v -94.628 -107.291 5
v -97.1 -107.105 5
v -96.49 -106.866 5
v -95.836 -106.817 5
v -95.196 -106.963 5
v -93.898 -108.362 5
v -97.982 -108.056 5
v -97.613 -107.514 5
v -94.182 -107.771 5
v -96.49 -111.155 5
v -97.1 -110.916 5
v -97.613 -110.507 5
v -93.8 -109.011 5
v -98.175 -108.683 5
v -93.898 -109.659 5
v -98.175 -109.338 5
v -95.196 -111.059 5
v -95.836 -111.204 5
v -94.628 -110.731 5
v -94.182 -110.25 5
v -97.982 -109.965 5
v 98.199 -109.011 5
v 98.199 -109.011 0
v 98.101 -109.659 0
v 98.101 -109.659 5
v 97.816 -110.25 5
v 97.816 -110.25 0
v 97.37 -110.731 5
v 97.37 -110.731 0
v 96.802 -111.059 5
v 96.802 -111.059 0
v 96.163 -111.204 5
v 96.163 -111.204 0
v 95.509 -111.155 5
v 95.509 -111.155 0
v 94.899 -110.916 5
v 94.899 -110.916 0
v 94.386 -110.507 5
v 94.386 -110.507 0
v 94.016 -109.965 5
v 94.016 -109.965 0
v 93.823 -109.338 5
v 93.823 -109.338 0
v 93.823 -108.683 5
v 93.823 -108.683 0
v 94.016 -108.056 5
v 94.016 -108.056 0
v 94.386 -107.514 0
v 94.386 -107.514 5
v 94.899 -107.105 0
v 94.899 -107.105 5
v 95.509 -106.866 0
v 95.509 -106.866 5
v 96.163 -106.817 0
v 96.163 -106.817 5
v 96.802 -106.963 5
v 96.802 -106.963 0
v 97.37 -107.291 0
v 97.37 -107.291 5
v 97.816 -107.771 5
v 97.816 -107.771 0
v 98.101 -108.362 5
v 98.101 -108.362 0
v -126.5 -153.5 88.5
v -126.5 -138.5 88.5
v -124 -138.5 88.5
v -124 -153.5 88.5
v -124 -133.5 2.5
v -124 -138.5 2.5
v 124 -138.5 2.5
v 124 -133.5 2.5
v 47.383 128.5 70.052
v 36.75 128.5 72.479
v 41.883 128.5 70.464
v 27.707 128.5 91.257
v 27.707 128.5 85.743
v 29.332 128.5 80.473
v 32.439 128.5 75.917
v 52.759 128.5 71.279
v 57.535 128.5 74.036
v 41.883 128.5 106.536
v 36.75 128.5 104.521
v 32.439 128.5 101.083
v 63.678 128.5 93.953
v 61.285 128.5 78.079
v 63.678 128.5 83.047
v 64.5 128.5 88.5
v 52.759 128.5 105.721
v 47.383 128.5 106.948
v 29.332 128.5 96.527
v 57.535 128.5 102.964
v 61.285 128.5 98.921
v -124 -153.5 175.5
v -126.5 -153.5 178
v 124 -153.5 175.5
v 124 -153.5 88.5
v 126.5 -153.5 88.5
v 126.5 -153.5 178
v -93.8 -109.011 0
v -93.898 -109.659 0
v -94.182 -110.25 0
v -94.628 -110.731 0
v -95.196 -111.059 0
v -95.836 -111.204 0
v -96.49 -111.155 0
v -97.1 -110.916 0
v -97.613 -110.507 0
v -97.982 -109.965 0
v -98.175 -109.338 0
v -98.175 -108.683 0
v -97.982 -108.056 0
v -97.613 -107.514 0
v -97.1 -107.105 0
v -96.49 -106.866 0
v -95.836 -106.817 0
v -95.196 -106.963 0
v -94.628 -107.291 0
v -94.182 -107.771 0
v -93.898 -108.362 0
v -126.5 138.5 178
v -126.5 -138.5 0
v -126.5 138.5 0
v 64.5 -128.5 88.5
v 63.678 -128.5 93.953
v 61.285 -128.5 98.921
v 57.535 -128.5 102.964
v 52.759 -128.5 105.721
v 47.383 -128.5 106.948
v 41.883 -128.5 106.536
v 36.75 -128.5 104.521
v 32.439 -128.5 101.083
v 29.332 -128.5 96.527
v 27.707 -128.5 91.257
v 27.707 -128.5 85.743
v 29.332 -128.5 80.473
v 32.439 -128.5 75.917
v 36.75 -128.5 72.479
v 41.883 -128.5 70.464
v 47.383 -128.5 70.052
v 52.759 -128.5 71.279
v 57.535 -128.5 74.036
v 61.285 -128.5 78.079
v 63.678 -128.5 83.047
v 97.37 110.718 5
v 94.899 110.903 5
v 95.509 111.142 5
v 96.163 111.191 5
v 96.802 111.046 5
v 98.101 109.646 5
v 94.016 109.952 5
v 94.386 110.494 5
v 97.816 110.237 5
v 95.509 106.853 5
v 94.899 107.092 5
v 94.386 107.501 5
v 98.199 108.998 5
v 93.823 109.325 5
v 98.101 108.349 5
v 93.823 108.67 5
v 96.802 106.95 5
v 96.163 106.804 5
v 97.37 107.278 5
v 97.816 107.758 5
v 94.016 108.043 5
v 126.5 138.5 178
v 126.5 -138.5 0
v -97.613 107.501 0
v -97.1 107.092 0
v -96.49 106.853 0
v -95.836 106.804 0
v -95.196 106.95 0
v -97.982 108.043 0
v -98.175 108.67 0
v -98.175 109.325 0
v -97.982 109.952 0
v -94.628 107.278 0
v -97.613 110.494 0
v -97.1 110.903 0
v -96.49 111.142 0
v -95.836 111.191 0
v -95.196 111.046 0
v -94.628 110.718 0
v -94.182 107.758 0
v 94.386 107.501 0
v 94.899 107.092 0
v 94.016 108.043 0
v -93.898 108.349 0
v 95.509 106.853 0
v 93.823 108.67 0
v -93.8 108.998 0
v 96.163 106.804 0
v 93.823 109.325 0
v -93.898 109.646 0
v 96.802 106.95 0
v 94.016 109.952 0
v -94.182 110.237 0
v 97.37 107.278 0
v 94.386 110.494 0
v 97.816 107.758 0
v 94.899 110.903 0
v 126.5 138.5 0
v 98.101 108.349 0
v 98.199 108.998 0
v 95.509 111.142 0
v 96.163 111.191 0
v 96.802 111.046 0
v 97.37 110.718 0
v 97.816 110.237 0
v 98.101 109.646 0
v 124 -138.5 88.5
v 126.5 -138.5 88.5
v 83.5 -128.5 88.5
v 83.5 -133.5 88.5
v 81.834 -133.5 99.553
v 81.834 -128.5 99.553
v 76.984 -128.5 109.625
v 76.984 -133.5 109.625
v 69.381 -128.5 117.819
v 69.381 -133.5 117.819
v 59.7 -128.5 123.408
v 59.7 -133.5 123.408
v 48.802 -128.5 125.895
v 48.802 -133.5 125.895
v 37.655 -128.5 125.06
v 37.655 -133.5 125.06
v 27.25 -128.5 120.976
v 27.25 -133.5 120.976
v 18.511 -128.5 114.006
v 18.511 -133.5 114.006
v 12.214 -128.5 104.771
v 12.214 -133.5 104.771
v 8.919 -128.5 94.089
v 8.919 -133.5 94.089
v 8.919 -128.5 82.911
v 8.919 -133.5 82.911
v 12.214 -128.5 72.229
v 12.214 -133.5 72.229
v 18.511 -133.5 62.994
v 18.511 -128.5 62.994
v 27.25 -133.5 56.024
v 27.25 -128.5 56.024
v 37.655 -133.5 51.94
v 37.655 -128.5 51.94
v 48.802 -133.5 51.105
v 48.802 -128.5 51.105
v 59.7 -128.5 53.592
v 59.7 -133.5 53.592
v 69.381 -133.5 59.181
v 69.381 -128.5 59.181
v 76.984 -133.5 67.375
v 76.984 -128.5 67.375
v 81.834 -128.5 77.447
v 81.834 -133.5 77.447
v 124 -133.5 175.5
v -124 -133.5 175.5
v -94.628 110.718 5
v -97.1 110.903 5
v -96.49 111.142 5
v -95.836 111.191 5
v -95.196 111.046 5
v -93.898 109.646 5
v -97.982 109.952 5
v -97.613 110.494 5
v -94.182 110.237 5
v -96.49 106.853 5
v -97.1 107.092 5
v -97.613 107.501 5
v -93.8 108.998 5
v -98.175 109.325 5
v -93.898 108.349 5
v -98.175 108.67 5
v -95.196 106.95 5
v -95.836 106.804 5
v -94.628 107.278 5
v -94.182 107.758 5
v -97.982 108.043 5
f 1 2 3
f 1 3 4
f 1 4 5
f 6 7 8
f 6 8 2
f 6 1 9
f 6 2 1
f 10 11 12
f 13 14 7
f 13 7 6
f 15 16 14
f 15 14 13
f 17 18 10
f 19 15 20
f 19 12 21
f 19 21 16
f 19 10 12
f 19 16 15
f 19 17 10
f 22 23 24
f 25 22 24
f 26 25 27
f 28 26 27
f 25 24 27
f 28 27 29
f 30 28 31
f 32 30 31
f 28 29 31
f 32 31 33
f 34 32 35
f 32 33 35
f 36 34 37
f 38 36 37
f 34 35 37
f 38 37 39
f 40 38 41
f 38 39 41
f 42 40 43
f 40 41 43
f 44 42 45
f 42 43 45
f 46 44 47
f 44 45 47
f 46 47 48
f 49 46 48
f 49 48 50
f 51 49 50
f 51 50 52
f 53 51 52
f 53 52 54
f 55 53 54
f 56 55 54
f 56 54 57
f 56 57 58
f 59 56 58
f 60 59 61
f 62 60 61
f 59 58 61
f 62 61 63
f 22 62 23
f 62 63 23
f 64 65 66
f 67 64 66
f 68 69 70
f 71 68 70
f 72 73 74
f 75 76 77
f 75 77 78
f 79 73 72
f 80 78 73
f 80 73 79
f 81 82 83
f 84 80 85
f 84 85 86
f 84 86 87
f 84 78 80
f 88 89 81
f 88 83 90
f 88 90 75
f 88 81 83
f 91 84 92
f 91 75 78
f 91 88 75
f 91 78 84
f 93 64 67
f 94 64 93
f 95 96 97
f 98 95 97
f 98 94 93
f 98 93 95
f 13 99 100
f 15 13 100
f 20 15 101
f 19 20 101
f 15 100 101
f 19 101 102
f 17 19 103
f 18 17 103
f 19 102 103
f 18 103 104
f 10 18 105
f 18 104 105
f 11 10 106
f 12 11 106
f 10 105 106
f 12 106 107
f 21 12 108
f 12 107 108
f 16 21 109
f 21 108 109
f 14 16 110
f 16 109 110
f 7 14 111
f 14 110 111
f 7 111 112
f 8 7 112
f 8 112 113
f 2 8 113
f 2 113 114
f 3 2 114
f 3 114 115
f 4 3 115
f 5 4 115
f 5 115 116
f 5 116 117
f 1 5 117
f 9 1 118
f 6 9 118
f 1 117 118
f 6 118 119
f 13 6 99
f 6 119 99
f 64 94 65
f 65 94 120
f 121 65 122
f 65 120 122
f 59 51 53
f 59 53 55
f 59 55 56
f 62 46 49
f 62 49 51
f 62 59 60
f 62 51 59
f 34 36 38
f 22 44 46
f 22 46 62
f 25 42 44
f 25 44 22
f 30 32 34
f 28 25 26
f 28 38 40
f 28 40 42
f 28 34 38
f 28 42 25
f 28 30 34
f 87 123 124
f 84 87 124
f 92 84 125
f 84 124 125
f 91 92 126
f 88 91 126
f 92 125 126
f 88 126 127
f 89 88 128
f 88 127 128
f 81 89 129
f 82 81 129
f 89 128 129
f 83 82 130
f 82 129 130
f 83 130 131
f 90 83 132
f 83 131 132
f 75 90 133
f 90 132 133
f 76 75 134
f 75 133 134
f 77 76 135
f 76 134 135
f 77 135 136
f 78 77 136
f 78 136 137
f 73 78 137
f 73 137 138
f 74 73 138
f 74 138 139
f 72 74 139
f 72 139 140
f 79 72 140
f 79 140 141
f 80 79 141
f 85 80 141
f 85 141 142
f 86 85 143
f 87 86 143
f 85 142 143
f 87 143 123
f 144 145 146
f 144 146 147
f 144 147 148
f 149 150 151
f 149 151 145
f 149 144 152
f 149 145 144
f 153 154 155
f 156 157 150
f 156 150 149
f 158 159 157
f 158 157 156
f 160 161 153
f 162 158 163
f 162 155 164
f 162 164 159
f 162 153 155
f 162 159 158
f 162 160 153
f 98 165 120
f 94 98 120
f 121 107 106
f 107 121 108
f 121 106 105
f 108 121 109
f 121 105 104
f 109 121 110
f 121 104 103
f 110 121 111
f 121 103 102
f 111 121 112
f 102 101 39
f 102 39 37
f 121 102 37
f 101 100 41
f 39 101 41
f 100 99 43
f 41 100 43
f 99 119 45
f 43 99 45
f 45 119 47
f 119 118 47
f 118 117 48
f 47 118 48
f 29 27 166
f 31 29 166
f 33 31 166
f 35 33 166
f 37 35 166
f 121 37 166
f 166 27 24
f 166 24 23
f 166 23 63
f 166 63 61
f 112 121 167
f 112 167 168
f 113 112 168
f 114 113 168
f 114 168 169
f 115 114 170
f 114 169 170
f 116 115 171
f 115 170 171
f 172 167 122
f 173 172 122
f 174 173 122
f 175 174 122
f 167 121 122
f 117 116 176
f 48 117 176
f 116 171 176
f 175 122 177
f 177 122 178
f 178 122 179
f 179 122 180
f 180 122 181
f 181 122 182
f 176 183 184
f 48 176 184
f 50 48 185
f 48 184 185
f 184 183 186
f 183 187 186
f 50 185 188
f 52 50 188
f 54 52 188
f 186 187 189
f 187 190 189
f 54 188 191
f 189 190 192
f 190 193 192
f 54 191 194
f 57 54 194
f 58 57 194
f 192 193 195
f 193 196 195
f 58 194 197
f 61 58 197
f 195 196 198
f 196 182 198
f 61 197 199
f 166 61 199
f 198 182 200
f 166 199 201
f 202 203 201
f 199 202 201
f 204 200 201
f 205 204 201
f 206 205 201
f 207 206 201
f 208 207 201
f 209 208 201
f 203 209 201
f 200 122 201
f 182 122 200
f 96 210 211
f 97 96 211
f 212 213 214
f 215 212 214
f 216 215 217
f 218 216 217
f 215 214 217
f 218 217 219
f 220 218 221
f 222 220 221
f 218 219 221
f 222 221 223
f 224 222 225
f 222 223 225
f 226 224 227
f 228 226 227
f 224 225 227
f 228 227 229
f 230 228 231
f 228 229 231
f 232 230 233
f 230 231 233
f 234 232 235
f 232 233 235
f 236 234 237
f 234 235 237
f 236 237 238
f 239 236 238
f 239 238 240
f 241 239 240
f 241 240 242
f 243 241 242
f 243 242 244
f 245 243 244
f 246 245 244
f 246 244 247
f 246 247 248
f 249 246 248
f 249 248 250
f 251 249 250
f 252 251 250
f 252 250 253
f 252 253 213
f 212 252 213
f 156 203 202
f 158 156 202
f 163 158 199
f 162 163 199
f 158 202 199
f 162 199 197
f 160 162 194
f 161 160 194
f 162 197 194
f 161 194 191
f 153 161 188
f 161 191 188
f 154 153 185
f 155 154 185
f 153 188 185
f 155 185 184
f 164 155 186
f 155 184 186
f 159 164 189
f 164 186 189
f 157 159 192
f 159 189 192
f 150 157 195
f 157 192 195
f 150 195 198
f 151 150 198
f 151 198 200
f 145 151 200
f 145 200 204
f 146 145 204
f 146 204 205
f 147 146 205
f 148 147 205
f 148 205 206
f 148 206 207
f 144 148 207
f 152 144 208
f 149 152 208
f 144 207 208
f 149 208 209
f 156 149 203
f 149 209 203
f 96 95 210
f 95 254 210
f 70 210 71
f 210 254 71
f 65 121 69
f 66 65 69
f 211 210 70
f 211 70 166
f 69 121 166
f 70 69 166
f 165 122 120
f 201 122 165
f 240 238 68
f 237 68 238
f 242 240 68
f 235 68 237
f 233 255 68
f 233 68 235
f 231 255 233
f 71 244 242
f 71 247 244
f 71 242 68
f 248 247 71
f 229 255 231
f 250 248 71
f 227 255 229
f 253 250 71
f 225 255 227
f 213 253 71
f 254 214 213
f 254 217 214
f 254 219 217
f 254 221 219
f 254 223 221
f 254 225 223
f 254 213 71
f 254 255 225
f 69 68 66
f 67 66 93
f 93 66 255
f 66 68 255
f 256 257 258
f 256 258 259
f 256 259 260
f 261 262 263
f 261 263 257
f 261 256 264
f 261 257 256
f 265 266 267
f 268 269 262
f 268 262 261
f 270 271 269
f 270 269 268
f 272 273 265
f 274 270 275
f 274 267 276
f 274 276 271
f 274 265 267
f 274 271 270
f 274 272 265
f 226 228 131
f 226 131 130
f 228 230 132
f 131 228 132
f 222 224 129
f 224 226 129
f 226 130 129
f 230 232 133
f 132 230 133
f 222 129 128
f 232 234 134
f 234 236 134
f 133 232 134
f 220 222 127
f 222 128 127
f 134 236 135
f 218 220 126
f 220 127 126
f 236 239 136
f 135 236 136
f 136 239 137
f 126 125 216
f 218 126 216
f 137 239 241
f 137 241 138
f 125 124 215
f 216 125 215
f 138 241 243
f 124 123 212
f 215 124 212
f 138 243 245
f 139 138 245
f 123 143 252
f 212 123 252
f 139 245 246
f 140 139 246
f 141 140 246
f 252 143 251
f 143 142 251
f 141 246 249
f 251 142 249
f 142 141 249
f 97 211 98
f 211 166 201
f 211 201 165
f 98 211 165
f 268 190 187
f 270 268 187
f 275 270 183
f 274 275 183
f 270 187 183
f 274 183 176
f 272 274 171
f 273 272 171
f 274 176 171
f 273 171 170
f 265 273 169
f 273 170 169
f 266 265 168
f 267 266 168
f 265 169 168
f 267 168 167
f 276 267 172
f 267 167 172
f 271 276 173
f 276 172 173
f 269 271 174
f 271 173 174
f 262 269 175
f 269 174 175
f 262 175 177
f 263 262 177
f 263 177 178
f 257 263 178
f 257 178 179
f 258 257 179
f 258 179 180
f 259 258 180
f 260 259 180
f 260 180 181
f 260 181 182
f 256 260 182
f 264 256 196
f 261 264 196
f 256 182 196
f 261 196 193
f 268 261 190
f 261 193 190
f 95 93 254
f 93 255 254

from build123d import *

# Parameters (mm, degrees)
F0_W      = 253
F0_H      = 277
F1_DEPTH  = 178
F2_W      = 248
F2_H      = 173
F2_R      = 37.5
F3_DEPTH  = 5
F5_DEPTH  = 15
F6_DEPTH  = 10
F7_R      = 18.5
F8_DEPTH  = 257
F9_R      = 2.2
F10_DEPTH = 5


with BuildPart() as f1:
    # F0 (on Top) → F1 (new body)
    with BuildSketch(Plane.XY):
        Rectangle(F0_W, F0_H)
    extrude(amount=F1_DEPTH)

    # F2 (on face) → F3 (cut)
    with BuildSketch(Plane.XZ.offset(138.5)):
        with Locations((0, 89)):
            Rectangle(F2_W, F2_H)
        with Locations((46, 88.5)):
            Circle(F2_R, mode=Mode.SUBTRACT)
    extrude(amount=-F3_DEPTH, mode=Mode.SUBTRACT)

    # F4 (on face) → F5 (join)
    with BuildSketch(Plane.XZ.offset(138.5)):
        Polygon((-126.5, 178), (-126.5, 88.5), (-124, 88.5), (-124, 175.5), (124, 175.5), (124, 88.5), (126.5, 88.5), (126.5, 178), align=None)
    extrude(amount=F5_DEPTH)

    # F6 (cut): a face of the model
    f6_faces = [f1.faces().sort_by_distance(p)[0] for p in [
        (46, -138.5, 88.5),
    ]]
    extrude(f6_faces, amount=-F6_DEPTH, mode=Mode.SUBTRACT)

    # F7 (on face) → F8 (cut)
    with BuildSketch(Plane.XZ.offset(128.5)):
        with Locations((46, 88.5)):
            Circle(F7_R)
    extrude(amount=-F8_DEPTH, mode=Mode.SUBTRACT)

    # F9 (on face) → F10 (cut)
    with BuildSketch(Plane(origin=(0, 0, 0), x_dir=(1, 0, 0), z_dir=(0, 0, -1))):
        with Locations((-96, 109.0106)):
            Circle(F9_R)
        with Locations((95.9986, 109.0106)):
            Circle(F9_R)
        with Locations((-96, -108.9976)):
            Circle(F9_R)
        with Locations((95.9986, -108.9976)):
            Circle(F9_R)
    extrude(amount=-F10_DEPTH, mode=Mode.SUBTRACT)


solid = f1.part
